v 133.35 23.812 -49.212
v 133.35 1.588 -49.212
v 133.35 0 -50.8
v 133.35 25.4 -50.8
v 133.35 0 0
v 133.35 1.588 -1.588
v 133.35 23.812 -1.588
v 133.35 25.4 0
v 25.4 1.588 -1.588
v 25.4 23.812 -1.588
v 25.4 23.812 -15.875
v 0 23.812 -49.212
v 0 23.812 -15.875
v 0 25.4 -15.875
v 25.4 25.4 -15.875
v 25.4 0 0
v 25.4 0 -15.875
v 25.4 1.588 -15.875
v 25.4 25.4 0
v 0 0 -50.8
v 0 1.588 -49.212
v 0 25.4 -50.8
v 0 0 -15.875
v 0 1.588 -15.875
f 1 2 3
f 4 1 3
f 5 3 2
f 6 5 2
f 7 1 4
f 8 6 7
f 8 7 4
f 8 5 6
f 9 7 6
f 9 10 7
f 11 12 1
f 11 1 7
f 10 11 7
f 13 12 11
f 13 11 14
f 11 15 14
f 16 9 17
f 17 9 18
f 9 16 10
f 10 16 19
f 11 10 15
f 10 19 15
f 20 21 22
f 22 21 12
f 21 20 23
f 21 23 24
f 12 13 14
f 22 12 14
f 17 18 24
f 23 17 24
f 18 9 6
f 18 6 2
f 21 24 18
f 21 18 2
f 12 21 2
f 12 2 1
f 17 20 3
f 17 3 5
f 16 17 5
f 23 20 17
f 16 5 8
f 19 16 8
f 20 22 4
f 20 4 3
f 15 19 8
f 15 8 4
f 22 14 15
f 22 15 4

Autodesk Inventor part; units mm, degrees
ref_plane "YZ Plane" through (0, 0, 0) normal (1, 0, 0) x (0, 1, 0)
ref_plane "XZ Plane" through (0, 0, 0) normal (0, 1, 0) x (-1, 0, 0)
ref_plane "XY Plane" through (0, 0, 0) normal (0, 0, 1) x (1, 0, 0)
sketch "Sketch1" plane through (0, 0, 0) normal (1, 0, 0) x (0, 1, 0)
  line L0 (0, 0) -> (25.4, 0)
  line L1 (25.4, 0) -> (25.4, -50.8)
  line L2 (25.4, -50.8) -> (0, -50.8)
  line L3 (0, -50.8) -> (0, 0)
  line L4 (23.8125, -1.5875) -> (1.5875, -1.5875)
  line L5 (1.5875, -1.5875) -> (1.5875, -49.2125)
  line L6 (1.5875, -49.2125) -> (23.8125, -49.2125)
  line L7 (23.8125, -49.2125) -> (23.8125, -1.5875)
  dimension "d0" = 25.4
  dimension "d1" = 50.8
  dimension "d2" = 1.5875
extrude "Extrusion1" add sketch "Sketch1" along normal blind 133.35
sketch "Sketch2" plane through (0, 25.4, 0) normal (0, 1, 0) x (1, 0, 0)
  line L0 (0, 0) -> (25.4, 0)
  line L1 (25.4, 0) -> (25.4, 15.875)
  line L2 (25.4, 15.875) -> (0, 15.875)
  line L3 (0, 15.875) -> (0, 0)
  dimension "d5" = 25.4
  dimension "d6" = 15.875
extrude "Extrusion2" cut sketch "Sketch2" against normal blind 82.55
properties part number "FRA_SideUpperSupport_003" material "Aluminum 6061"
